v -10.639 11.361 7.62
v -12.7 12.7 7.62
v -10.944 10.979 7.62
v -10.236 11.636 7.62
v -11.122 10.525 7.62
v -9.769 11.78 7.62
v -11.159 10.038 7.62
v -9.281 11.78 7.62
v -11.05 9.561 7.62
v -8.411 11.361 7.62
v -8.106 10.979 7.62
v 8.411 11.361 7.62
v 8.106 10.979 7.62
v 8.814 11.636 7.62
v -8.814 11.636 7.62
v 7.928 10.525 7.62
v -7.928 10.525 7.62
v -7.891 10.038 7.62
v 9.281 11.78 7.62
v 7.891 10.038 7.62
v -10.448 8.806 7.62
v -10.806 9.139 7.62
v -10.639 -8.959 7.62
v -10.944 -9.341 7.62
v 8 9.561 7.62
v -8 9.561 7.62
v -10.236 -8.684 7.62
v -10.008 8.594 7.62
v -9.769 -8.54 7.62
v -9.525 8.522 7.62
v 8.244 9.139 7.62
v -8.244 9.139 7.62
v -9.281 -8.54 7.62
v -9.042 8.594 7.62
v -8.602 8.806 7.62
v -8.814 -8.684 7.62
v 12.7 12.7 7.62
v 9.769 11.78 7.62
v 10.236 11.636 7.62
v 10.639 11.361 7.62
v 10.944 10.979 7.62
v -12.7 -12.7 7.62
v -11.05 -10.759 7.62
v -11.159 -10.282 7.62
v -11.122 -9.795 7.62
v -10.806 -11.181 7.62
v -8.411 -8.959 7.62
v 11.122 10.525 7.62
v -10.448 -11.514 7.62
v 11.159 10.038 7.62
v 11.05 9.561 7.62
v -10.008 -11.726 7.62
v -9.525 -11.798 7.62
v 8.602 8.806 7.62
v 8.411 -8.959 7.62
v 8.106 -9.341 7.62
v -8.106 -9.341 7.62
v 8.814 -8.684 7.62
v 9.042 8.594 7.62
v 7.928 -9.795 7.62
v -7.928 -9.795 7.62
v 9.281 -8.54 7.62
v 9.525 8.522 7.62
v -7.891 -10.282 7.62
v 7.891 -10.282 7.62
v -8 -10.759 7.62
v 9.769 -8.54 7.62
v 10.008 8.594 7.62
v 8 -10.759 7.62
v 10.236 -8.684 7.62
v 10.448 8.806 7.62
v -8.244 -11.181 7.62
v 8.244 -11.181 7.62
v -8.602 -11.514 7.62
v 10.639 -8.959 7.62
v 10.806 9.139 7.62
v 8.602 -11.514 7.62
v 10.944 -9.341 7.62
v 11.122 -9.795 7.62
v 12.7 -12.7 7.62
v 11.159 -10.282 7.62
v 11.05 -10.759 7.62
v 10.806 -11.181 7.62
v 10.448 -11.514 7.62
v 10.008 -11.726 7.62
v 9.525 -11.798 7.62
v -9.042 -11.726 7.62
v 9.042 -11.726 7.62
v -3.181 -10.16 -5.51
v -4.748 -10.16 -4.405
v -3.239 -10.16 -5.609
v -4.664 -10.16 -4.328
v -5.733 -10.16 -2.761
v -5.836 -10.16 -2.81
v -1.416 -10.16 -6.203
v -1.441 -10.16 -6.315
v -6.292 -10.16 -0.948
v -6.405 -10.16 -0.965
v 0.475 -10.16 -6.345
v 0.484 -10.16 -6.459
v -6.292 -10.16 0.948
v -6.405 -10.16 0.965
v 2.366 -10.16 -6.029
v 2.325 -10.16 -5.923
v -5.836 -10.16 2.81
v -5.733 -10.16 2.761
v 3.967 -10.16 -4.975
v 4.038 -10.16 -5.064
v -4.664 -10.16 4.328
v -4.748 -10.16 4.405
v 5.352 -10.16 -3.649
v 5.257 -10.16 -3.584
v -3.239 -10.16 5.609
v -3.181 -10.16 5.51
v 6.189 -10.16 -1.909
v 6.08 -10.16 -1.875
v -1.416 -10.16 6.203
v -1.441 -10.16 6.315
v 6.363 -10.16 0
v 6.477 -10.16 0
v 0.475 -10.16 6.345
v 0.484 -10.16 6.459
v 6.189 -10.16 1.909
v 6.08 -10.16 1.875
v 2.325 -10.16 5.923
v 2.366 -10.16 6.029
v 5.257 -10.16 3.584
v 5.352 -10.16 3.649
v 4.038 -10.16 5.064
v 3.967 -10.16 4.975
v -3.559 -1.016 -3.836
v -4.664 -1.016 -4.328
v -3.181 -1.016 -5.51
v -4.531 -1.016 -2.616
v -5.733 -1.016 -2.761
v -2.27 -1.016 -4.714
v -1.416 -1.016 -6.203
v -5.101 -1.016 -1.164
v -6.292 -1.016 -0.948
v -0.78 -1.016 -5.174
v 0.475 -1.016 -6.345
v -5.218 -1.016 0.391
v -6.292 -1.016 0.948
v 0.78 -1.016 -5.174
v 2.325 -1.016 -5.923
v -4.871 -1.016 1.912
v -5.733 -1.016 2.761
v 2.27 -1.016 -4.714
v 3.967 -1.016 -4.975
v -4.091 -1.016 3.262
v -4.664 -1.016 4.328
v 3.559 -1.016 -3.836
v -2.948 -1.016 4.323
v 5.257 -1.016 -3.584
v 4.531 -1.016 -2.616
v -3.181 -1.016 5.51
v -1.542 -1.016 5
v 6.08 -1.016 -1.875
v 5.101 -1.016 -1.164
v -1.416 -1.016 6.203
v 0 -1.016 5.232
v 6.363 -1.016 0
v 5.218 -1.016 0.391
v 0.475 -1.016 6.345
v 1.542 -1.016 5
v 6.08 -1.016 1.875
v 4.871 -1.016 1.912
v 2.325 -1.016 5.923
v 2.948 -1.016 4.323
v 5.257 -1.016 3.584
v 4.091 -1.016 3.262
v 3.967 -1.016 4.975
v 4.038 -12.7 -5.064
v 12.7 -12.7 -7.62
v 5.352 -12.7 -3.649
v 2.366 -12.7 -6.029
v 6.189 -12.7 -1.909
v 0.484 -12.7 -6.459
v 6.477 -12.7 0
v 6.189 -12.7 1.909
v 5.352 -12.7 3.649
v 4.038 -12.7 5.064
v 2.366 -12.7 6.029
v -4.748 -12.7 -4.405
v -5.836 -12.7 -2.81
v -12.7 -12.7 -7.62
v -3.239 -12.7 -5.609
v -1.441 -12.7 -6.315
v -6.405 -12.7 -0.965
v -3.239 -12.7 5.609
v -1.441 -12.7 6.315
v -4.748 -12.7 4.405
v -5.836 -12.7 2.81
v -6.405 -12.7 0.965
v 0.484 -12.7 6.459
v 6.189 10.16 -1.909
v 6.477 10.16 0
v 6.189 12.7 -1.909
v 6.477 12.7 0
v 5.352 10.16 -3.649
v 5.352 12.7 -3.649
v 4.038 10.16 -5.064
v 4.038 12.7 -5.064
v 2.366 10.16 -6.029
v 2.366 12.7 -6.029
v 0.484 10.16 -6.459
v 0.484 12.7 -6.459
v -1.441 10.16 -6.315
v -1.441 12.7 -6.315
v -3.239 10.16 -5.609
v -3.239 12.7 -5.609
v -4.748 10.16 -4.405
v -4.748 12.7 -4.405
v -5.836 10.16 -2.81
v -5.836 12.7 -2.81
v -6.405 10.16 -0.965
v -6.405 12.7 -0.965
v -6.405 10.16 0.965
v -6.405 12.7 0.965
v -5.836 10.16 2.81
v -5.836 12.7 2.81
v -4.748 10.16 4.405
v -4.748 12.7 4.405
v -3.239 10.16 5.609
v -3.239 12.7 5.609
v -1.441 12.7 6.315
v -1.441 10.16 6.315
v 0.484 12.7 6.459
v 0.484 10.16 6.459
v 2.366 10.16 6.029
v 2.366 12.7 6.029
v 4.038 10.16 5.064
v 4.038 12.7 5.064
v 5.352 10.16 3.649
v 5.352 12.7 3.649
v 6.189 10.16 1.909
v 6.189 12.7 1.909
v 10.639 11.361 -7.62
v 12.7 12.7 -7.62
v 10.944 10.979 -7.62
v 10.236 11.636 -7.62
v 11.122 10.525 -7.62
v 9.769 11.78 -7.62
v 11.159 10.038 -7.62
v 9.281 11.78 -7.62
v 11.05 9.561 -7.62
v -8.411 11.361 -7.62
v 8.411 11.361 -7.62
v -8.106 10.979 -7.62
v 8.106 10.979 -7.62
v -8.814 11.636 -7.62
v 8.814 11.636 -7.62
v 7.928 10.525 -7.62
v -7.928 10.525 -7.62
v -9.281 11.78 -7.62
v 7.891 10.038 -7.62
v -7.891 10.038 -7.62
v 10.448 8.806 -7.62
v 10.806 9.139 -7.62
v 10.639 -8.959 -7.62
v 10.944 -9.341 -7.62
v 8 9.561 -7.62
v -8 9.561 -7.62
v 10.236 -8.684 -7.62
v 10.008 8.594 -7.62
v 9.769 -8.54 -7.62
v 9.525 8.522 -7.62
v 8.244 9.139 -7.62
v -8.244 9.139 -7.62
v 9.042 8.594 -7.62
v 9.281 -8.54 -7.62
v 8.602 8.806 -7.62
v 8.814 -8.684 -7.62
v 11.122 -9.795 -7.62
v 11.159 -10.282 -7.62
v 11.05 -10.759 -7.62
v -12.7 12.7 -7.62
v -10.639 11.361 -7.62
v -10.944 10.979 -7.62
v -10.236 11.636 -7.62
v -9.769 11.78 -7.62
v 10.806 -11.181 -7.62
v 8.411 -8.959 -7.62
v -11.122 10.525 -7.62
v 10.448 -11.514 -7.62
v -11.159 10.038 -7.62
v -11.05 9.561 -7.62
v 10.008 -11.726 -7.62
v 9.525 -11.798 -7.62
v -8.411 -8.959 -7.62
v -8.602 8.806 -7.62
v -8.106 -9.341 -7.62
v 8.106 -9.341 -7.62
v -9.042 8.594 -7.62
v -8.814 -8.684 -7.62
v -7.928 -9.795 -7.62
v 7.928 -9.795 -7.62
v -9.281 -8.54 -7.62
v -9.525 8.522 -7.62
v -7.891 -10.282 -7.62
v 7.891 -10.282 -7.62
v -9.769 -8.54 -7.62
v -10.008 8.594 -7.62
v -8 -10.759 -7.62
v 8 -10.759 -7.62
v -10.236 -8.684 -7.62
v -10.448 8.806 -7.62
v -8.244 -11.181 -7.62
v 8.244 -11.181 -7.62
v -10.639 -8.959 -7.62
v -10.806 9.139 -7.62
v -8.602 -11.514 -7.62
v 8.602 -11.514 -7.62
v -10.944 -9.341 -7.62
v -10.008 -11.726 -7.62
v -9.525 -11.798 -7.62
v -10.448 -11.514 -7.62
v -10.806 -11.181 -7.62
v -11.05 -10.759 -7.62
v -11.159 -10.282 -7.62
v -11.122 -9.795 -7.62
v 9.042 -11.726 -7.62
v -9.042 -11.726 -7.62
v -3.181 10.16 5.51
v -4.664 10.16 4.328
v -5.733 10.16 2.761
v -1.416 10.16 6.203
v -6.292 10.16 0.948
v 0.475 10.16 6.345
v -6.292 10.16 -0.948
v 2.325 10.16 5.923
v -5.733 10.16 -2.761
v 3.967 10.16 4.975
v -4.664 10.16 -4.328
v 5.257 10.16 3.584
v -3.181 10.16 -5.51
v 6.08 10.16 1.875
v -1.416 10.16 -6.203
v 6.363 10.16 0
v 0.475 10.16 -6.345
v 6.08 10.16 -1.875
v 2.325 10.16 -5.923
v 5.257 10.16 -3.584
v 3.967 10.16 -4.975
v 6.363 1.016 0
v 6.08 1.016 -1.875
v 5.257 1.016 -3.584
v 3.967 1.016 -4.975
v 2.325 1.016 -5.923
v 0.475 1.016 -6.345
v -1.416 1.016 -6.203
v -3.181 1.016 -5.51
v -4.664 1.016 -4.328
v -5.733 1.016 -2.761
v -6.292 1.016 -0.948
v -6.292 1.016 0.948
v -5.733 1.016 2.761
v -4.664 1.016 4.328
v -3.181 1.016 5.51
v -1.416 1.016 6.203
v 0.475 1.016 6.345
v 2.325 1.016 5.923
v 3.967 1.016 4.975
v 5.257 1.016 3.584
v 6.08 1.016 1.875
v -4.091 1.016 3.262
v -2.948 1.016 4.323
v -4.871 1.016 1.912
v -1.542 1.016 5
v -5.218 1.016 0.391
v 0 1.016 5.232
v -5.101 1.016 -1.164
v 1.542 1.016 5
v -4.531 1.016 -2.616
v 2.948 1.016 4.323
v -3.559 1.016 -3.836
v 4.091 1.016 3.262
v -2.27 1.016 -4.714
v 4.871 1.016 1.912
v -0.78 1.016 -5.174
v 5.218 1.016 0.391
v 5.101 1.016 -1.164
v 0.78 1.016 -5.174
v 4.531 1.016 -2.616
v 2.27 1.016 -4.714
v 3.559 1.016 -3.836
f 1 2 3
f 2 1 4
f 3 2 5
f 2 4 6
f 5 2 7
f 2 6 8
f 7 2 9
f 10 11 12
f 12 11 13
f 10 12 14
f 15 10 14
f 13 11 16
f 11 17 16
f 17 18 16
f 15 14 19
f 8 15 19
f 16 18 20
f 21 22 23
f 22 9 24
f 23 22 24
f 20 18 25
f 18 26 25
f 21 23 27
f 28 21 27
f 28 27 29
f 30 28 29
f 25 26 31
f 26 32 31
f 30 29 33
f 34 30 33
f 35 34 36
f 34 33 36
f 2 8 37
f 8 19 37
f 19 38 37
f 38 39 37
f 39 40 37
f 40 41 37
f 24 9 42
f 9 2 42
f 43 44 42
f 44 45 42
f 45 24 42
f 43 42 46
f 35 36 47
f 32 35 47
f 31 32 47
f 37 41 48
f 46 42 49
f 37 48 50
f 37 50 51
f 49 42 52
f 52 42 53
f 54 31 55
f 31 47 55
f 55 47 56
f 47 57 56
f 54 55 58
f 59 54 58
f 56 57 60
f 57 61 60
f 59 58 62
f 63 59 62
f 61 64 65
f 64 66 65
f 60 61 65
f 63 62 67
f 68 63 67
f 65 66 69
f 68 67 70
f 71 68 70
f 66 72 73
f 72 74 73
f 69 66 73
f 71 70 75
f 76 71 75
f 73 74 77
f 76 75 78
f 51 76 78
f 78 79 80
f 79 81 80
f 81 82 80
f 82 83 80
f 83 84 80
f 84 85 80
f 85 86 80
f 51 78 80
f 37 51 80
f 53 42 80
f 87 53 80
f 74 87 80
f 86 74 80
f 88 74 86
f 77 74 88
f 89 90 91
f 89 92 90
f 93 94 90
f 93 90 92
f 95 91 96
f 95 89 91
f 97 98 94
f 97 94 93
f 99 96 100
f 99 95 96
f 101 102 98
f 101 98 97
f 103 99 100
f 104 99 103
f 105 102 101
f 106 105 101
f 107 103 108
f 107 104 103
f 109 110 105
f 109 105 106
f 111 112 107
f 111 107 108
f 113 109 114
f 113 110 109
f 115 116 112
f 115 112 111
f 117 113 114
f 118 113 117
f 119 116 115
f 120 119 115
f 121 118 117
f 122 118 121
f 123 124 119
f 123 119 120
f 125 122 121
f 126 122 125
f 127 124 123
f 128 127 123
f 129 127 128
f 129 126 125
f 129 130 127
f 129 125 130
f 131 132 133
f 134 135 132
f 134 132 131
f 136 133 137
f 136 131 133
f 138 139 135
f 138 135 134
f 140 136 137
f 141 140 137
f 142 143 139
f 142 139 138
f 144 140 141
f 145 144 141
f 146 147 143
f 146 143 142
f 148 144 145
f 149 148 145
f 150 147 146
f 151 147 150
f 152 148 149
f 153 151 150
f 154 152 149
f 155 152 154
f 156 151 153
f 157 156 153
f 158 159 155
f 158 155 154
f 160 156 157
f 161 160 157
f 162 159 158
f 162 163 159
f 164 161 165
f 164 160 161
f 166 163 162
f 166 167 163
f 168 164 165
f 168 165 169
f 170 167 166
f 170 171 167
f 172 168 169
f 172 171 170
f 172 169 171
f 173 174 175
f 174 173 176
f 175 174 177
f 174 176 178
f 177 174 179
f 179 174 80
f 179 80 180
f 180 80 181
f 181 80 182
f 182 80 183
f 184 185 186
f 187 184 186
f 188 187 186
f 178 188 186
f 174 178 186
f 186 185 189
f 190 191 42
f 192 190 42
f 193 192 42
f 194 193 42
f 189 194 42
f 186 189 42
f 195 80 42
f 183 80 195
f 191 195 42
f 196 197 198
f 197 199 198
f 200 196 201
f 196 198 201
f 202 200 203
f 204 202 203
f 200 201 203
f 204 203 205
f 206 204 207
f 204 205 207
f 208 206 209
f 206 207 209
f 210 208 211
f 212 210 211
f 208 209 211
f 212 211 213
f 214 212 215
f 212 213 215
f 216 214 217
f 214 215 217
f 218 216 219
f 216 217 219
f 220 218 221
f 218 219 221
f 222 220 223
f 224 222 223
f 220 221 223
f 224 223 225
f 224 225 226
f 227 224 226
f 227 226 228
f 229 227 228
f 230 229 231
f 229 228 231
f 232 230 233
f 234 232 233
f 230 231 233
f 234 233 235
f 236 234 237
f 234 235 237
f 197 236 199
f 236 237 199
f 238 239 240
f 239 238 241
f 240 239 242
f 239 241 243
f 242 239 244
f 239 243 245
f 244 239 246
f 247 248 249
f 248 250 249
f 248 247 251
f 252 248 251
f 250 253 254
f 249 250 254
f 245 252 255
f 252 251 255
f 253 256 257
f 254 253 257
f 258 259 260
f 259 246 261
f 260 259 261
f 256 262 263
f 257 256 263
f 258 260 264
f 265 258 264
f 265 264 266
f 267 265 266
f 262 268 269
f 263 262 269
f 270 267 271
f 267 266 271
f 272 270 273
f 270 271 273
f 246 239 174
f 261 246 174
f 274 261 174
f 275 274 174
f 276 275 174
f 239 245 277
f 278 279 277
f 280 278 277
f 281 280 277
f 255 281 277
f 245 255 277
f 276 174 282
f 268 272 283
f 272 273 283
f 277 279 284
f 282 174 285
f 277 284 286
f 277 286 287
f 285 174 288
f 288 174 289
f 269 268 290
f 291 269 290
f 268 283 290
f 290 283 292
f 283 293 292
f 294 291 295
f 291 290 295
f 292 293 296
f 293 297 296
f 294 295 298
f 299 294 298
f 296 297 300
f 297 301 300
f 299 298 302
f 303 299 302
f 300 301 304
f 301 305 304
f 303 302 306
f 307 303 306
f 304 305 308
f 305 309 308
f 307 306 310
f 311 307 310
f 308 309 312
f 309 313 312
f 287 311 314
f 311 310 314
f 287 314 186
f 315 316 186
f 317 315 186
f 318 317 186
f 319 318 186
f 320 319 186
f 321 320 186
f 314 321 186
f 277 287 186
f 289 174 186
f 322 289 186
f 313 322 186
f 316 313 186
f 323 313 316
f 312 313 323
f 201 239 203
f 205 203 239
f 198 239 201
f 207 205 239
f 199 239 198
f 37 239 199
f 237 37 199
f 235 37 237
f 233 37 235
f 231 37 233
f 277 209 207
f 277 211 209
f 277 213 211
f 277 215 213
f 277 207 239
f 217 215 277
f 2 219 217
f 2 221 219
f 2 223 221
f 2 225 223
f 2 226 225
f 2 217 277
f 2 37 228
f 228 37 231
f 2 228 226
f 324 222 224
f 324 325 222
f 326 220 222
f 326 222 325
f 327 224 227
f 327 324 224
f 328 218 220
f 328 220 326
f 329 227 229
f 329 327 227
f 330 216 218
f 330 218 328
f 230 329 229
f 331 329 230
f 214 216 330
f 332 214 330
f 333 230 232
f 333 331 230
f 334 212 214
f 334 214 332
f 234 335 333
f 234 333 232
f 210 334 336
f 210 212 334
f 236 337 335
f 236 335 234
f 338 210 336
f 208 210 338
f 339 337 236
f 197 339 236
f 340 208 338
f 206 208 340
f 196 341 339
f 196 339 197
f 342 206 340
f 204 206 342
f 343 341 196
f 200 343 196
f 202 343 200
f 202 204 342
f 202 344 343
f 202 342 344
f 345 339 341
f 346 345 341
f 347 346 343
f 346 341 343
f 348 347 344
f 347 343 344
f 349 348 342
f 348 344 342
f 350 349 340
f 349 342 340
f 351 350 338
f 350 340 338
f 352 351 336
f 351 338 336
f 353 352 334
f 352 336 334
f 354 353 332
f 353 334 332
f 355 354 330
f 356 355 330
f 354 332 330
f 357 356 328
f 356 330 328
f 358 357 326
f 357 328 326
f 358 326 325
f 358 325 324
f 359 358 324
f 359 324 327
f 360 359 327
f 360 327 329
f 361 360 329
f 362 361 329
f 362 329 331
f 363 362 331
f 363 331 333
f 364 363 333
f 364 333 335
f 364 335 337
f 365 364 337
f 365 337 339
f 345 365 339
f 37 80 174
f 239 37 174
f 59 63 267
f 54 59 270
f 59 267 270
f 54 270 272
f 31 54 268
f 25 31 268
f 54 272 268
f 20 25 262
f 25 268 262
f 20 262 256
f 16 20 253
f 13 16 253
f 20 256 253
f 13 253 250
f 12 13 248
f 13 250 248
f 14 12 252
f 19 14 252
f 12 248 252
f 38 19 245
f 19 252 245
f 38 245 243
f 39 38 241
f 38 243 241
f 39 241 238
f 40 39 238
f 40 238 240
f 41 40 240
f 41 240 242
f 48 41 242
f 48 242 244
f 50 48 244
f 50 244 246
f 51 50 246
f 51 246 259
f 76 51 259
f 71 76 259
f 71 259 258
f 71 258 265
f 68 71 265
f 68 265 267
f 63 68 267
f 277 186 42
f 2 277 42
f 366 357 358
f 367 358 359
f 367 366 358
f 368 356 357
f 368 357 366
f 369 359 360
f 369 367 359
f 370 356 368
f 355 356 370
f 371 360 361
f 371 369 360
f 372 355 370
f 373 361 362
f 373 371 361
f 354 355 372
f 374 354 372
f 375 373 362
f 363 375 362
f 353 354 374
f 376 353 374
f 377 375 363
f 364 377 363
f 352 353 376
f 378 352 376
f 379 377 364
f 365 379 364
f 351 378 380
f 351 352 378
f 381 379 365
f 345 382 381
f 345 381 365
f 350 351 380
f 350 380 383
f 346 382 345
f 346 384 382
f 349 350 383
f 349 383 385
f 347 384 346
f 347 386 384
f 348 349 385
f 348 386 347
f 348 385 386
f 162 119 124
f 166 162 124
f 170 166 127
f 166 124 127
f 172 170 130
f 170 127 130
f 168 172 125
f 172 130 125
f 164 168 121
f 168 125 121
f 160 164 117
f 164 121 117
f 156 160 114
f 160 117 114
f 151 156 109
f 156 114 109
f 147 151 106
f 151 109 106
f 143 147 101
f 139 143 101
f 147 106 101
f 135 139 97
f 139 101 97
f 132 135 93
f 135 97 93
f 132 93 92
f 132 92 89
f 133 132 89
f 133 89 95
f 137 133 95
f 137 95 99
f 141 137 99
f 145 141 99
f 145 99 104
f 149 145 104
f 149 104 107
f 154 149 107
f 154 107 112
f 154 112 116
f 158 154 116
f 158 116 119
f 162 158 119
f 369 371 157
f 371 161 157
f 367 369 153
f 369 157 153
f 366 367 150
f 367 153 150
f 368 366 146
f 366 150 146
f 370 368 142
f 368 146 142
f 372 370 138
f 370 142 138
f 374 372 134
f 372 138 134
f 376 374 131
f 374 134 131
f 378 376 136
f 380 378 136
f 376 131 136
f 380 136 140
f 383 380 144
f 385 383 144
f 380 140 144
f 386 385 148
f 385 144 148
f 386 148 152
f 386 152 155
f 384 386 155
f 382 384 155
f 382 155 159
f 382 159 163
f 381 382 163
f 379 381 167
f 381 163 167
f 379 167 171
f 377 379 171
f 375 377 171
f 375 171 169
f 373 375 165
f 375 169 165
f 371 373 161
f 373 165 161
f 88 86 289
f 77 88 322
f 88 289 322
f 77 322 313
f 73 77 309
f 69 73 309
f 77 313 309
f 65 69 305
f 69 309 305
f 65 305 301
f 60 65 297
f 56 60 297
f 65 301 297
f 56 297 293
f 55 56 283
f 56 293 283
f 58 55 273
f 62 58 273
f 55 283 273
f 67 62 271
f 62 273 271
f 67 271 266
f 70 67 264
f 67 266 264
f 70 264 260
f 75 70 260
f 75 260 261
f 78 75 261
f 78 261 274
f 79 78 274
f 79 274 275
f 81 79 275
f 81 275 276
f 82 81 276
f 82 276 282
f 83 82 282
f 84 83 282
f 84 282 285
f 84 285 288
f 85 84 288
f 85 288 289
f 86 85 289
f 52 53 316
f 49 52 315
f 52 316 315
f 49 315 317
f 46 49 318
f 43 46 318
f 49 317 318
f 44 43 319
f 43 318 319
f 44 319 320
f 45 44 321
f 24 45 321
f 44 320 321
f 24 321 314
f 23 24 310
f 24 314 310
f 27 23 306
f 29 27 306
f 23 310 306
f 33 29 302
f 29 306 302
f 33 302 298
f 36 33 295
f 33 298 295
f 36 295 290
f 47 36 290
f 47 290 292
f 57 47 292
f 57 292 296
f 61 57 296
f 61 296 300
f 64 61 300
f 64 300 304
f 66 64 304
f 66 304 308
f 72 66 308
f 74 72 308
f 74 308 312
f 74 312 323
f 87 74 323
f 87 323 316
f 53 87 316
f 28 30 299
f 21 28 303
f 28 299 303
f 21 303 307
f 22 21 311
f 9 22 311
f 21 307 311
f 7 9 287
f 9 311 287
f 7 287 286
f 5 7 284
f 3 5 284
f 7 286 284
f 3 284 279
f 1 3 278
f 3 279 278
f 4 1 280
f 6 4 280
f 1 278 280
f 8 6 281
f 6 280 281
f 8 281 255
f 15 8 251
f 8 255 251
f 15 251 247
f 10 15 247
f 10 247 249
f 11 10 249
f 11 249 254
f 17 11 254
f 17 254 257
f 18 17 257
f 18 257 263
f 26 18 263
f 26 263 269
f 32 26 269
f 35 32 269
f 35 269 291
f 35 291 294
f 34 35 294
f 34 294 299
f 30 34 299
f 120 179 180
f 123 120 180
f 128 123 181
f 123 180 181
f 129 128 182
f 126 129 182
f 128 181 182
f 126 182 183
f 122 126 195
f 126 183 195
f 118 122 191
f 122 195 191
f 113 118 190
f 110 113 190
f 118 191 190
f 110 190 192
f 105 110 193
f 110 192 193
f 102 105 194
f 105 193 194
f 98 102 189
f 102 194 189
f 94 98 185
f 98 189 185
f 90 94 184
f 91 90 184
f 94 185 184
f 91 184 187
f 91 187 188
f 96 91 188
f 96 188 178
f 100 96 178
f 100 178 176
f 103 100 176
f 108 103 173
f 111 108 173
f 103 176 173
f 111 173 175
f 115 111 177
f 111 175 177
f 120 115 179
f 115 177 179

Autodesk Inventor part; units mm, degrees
ref_plane "YZ Plane" through (0, 0, 0) normal (1, 0, 0) x (0, 1, 0)
ref_plane "XZ Plane" through (0, 0, 0) normal (0, 1, 0) x (-1, 0, 0)
ref_plane "XY Plane" through (0, 0, 0) normal (0, 0, 1) x (1, 0, 0)
sketch "Sketch1" plane through (0, 0, 0) normal (0, 1, 0) x (-1, 0, 0)
  circle A0 centre (0, 0) radius 7.62
  line L0 (12.7, 7.62) -> (-12.7, 7.62)
  line L1 (-12.7, 7.62) -> (-12.7, -7.62)
  line L2 (-12.7, -7.62) -> (12.7, -7.62)
  line L3 (12.7, -7.62) -> (12.7, 7.62)
  line L4 (12.7, 7.62) -> (-12.7, -7.62) construction
  line L5 (-12.7, 7.62) -> (12.7, -7.62) construction
  line L6 (12.7, 7.62) -> (38.1, 7.62) construction
  dimension "d0" = 15.24
  dimension "d27" = 25.4
  dimension "d28" = 180
  dimension "d29" = 15.24
extrude "Extrusion1" add sketch "Sketch1" along normal mid plane 25.4
sketch "Sketch2" plane through (0, 12.7, 0) normal (0, 1, 0) x (1, 0, 0)
  circle A0 centre (0, 0) radius 3.175
  dimension "d3" = 6.35
hole "Hole1" at (0, 12.7, 0) direction (0, -1, 0) diameter 10.4648 depth 24.7904 tip angle 118
sketch "Sketch3" plane through (0, 12.7, 0) normal (0, 1, 0) x (1, 0, 0)
  circle A0 centre (0, 0) radius 6.3627
  dimension "d6" = 12.7254
extrude "Extrusion3" cut sketch "Sketch3" against normal blind 11.684
sketch "Sketch4" plane through (0, -12.7, 0) normal (0, -1, 0) x (1, 0, 0)
  circle A0 centre (0, 0) radius 6.3627
  dimension "d9" = 12.7254
extrude "Extrusion4" cut sketch "Sketch4" against normal blind 11.684
sketch "Sketch5" plane through (0, 12.7, 0) normal (0, 1, 0) x (1, 0, 0)
  circle A0 centre (0, 0) radius 6.477
  dimension "d13" = 12.954
extrude "Extrusion5" cut sketch "Sketch5" against normal blind 2.54
sketch "Sketch6" plane through (0, -12.7, 0) normal (0, -1, 0) x (1, 0, 0)
  circle A0 centre (0, 0) radius 6.477
  dimension "d16" = 12.954
extrude "Extrusion6" cut sketch "Sketch6" against normal blind 2.54
sketch "Sketch7" plane through (-12.7, 12.7, 7.62) normal (0, 0, 1) x (1, 0, 0)
  line L0 (3.175, -2.54) -> (22.225, -2.54) construction
  line L1 (22.225, -2.54) -> (22.225, -22.86) construction
  line L2 (22.225, -22.86) -> (3.175, -22.86) construction
  line L3 (3.175, -22.86) -> (3.175, -2.54) construction
  line L4 (3.175, -2.54) -> (22.225, -22.86) construction
  line L5 (22.225, -2.54) -> (3.175, -22.86) construction
  point P0 (12.7, -12.7)
  dimension "d30" = 19.05
  dimension "d31" = 20.32
hole "Hole2" at (9.525, 10.16, 7.62) at (9.525, -10.16, 7.62) at (-9.525, -10.16, 7.62) at (-9.525, 10.16, 7.62) direction (0, 0, -1) diameter 3.2766 end through all clearance for "Flat Head Machine Screw (82)" size "#4" standard "Ansi Unified Screw Threads"
properties part number "brassbushing2" material "Copper"
